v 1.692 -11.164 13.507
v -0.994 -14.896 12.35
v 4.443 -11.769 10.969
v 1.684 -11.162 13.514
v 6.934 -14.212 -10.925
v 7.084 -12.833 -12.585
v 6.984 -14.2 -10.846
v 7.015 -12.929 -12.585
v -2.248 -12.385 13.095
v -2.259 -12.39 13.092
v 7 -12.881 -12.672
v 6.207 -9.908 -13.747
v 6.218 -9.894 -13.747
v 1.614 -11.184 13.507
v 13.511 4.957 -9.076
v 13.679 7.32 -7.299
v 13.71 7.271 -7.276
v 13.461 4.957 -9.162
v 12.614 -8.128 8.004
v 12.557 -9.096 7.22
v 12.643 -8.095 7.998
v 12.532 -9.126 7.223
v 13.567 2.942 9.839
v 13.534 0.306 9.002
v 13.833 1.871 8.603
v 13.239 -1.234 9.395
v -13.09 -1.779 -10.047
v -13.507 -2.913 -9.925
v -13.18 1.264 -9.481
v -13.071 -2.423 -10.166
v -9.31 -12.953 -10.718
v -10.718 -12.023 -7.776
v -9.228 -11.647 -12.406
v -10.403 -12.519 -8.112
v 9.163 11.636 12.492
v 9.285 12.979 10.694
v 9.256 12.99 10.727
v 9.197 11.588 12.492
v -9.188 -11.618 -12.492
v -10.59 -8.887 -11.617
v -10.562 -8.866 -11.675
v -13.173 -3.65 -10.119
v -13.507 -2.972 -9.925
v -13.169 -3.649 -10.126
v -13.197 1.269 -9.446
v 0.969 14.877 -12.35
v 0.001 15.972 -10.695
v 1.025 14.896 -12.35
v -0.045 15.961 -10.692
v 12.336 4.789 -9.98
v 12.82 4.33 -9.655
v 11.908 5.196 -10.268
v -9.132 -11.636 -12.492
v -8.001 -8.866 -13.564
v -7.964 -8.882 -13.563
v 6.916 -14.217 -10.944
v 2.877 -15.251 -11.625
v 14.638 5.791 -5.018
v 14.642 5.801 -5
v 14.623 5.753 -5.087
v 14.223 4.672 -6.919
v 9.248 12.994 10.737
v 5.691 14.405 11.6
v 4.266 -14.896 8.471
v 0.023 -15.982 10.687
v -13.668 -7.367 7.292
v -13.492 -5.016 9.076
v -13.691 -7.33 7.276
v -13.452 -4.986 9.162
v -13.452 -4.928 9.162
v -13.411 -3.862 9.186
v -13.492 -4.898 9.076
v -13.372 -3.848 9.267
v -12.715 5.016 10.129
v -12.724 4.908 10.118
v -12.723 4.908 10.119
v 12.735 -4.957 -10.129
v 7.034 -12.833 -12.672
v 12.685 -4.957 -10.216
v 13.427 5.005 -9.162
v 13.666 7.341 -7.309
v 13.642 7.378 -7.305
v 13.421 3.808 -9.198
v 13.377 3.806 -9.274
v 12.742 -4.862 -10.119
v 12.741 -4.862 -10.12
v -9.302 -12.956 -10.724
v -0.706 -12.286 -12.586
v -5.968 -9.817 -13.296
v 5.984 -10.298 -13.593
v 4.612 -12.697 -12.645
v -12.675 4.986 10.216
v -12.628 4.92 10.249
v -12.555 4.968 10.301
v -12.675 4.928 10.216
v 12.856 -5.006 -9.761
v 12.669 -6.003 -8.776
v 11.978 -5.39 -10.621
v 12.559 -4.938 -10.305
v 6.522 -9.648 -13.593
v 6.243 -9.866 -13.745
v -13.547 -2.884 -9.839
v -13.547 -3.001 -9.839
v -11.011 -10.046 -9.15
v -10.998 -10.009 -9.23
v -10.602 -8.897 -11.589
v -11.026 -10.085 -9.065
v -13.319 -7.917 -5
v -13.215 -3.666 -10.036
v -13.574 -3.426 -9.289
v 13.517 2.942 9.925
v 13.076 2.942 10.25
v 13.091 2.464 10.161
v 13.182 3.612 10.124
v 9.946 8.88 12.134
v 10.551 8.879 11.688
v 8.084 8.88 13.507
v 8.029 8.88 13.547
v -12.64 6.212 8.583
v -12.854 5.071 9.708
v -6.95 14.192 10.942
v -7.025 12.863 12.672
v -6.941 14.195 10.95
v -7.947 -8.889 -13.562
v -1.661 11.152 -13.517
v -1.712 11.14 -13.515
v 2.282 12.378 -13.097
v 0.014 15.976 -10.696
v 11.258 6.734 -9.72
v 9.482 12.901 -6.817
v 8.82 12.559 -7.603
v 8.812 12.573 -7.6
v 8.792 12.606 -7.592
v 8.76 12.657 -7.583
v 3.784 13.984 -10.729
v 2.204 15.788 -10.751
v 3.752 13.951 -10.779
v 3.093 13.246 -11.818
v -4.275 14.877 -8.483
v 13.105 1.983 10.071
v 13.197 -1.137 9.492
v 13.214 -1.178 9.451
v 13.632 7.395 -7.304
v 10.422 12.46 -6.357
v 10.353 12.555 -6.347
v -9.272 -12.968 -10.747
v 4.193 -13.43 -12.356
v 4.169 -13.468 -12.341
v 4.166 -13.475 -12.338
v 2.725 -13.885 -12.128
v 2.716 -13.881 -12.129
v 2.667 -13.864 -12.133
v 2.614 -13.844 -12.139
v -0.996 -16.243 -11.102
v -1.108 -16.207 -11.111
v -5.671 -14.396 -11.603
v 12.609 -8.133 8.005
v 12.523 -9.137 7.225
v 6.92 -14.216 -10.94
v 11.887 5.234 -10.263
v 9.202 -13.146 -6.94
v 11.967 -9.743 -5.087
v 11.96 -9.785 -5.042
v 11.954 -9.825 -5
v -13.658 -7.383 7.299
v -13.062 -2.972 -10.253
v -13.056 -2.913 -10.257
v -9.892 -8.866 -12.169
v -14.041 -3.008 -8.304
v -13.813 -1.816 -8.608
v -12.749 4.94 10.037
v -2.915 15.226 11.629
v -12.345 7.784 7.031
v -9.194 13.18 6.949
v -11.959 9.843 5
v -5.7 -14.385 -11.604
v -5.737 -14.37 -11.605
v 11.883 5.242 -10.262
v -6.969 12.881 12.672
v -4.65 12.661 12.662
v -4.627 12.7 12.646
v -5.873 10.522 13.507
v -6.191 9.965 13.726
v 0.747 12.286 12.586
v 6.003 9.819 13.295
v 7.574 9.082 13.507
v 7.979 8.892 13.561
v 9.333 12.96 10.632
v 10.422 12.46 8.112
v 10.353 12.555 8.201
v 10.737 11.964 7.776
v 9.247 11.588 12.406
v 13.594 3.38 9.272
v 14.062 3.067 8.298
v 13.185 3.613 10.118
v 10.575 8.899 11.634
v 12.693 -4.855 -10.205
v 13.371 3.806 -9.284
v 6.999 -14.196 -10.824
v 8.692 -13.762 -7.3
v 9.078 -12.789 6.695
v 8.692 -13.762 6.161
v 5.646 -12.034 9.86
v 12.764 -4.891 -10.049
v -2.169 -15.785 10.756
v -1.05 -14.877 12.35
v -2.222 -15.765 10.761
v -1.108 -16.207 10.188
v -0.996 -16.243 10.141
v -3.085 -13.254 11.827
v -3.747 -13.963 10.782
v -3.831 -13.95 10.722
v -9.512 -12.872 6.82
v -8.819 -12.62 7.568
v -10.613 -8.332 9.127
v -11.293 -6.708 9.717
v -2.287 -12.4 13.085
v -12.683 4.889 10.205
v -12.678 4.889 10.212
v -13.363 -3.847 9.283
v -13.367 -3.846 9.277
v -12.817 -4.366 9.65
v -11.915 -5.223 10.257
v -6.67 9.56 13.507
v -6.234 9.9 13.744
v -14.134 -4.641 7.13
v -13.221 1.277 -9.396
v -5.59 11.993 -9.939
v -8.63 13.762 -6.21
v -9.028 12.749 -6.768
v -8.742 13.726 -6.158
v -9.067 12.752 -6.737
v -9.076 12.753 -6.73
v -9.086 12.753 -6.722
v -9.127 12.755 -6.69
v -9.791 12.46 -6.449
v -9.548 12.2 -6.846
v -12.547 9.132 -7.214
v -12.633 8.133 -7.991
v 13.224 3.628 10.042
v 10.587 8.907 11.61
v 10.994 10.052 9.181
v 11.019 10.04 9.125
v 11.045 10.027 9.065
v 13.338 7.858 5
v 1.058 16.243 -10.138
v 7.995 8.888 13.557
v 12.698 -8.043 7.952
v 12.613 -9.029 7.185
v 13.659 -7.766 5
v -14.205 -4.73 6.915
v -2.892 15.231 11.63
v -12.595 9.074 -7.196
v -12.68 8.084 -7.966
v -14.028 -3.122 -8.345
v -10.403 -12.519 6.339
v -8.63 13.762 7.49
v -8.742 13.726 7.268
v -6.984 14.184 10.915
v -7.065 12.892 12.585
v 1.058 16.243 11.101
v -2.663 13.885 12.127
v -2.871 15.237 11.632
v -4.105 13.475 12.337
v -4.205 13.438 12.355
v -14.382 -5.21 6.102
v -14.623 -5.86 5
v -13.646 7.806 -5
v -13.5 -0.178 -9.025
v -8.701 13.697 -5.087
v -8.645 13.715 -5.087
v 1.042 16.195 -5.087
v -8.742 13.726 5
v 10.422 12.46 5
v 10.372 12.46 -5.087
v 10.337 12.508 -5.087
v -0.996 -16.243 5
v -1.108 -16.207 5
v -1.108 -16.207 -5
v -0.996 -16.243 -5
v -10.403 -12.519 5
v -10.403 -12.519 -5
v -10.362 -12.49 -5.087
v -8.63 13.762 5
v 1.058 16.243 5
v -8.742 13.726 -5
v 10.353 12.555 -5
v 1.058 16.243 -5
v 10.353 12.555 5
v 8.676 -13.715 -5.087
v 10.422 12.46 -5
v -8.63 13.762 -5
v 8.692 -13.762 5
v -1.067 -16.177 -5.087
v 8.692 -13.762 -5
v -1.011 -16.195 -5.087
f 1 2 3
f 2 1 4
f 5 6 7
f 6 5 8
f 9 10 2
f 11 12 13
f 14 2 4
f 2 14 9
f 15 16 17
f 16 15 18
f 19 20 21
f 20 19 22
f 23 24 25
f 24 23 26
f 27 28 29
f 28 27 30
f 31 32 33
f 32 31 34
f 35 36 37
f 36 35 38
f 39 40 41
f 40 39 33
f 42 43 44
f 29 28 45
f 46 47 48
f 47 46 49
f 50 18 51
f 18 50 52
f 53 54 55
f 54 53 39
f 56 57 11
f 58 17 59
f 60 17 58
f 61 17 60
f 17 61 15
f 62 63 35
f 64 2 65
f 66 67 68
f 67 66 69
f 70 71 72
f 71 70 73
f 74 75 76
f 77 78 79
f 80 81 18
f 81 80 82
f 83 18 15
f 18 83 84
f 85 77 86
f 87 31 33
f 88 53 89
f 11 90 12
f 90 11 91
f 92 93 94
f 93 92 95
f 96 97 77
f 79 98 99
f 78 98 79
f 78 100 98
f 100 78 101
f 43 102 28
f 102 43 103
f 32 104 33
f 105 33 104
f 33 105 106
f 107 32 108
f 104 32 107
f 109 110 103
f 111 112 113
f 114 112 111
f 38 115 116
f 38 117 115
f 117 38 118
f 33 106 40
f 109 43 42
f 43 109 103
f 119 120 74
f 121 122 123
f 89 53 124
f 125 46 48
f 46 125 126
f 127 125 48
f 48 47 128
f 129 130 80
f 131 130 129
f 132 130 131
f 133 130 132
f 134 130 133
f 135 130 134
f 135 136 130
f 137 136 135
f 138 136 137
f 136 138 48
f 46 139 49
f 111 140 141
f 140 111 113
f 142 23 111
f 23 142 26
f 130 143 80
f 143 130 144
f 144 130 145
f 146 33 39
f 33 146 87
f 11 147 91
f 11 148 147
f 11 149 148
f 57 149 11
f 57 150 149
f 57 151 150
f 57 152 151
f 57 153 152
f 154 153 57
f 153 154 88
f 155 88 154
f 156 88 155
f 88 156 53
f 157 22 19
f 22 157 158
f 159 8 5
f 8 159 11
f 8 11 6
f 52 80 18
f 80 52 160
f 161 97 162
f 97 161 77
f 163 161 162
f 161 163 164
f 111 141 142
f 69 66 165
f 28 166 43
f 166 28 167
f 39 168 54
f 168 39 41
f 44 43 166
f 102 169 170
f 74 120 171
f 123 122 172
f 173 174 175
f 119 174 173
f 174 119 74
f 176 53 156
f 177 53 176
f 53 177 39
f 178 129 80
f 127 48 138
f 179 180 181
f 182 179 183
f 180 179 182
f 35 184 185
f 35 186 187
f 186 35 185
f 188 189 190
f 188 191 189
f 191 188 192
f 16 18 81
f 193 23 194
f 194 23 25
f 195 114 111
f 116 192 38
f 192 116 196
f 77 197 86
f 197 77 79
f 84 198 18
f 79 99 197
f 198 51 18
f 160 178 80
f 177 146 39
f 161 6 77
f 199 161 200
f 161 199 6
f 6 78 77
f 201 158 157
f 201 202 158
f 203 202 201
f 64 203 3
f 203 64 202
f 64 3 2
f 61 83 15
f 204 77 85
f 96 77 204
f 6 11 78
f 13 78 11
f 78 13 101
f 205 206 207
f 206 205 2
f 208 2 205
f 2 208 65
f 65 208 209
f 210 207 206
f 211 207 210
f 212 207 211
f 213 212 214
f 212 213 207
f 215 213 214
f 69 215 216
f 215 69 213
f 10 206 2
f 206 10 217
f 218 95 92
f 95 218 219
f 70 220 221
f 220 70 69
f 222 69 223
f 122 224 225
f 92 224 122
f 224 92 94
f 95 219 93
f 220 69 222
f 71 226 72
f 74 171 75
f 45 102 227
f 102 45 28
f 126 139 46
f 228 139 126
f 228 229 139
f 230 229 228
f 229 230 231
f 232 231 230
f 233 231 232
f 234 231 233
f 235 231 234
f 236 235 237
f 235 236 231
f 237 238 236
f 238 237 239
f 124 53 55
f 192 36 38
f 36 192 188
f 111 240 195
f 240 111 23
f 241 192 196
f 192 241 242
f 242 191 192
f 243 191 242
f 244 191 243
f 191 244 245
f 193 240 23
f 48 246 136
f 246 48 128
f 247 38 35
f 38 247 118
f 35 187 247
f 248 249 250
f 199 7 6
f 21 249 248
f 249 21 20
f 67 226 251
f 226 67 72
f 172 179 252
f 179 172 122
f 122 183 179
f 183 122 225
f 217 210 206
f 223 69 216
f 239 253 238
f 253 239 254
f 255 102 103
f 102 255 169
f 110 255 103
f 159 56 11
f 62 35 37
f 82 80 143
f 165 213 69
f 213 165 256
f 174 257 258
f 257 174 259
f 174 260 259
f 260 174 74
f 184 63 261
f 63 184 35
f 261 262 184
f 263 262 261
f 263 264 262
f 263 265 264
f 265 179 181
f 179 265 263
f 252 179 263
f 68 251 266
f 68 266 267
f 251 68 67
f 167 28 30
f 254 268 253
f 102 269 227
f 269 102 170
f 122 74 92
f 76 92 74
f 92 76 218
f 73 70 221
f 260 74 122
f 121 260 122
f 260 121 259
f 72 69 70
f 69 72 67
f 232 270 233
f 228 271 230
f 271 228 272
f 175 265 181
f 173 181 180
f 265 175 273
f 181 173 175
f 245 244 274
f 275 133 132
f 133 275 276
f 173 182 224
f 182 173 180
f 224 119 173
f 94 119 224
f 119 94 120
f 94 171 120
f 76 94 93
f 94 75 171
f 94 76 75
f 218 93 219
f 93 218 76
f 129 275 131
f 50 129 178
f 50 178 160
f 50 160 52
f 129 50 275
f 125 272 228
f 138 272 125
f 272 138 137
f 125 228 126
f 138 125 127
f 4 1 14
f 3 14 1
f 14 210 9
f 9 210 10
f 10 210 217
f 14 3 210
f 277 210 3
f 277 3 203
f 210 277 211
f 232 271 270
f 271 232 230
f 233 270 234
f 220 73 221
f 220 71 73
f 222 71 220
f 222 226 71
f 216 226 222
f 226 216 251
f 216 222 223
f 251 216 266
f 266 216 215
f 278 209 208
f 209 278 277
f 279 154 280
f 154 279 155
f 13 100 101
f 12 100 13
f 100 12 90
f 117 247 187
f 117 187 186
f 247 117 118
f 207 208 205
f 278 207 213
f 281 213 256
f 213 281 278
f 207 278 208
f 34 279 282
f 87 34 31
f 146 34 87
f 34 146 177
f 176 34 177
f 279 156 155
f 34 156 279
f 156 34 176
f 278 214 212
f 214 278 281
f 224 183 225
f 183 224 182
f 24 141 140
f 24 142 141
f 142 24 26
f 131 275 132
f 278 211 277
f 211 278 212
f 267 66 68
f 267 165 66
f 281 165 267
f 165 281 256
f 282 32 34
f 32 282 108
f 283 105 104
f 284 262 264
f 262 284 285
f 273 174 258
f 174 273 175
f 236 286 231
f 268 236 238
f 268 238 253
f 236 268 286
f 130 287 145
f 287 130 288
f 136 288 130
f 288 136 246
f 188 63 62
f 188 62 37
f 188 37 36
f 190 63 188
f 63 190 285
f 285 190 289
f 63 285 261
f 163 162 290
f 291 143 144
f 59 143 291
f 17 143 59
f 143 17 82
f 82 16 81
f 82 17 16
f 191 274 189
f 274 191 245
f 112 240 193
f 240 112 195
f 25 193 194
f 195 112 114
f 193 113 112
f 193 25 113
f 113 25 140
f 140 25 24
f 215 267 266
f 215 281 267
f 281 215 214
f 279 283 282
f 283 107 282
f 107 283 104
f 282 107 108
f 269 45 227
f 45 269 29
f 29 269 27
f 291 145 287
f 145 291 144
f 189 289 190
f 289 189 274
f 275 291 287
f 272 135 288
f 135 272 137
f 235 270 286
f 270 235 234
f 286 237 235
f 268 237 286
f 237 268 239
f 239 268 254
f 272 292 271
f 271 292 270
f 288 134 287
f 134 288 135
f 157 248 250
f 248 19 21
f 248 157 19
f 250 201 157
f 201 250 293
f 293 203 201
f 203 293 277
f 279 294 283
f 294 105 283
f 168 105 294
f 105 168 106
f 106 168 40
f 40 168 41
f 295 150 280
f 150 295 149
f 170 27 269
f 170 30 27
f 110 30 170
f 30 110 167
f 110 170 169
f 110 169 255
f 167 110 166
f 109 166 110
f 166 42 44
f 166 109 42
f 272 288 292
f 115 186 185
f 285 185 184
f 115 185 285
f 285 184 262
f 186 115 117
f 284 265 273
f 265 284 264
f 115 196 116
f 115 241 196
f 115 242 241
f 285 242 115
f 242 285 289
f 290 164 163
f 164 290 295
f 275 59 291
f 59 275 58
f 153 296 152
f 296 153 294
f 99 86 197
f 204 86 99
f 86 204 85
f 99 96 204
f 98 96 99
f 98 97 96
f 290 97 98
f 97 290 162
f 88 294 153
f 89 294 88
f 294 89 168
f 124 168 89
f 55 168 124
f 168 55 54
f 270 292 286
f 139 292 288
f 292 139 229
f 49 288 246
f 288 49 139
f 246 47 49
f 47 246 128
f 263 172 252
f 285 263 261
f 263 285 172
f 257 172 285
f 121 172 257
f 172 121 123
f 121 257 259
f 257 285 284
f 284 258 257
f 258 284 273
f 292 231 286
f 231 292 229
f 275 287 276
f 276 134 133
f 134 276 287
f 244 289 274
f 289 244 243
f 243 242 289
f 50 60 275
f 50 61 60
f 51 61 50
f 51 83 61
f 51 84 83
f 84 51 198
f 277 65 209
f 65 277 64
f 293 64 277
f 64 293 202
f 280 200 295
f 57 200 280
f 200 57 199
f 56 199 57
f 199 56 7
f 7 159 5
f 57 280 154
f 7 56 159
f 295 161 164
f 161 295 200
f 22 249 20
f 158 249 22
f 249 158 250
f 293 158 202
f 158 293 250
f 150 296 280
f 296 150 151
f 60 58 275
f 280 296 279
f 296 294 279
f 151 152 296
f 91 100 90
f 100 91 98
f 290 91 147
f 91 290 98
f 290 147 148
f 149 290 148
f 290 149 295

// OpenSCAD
// Auto-generated OpenSCAD file

    inner_points = 10*[[-0.10267110435699114, -1.6147732450963963, 0.5000000000008641], [-0.1026711043570435, -1.6147732450969283, -0.4999999999991359], [0.1026711043570435, 1.6147732450969283, 0.4999999999991359], [0.10267110435699114, 1.6147732450963963, -0.5000000000008641], [0.8660772310082325, -1.3667275583225522, 0.5000000000006815], [0.8660772310081802, -1.3667275583230845, -0.4999999999993185], [-1.0322025675203217, -1.2460304363672796, 0.5000000000007166], [-1.032202567520374, -1.2460304363678119, -0.49999999999928335], [1.032202567520374, 1.2460304363678119, 0.49999999999928335], [1.0322025675203217, 1.2460304363672796, -0.5000000000007166], [-0.8660772310081802, 1.3667275583230845, 0.4999999999993185], [-0.8660772310082325, 1.3667275583225522, -0.5000000000006815], [1.504013501010716, -0.596638397630546, 0.5000000000002386], [1.5040135010106637, -0.5966383976310778, -0.4999999999997614], [-1.5674677331657878, -0.40134635196262397, 0.5000000000002954], [-1.5674677331658402, -0.4013463519631557, -0.4999999999997045], [1.5674677331658402, 0.4013463519631557, 0.4999999999997045], [1.5674677331657878, 0.40134635196262397, -0.5000000000002954], [-1.5040135010106637, 0.5966383976310778, 0.4999999999997614], [-1.504013501010716, 0.596638397630546, -0.5000000000002386], [0.2110002639625055, -0.8240665545671229, 1.8763819204716008], [-0.3136713683195228, -0.7907066905295395, -1.8763819204707366], [0.3136713683195228, 0.7907066905295395, 1.8763819204707366], [-0.2110002639625055, 0.8240665545671229, -1.8763819204716008], [-0.718531199200825, -0.4553237458380063, 1.8763819204714534], [0.6550769670457008, -0.5426610037556955, -1.8763819204709191], [-0.6550769670457008, 0.5426610037556955, 1.8763819204709191], [0.718531199200825, 0.4553237458380063, -1.8763819204714534], [0.8489365339649888, -0.05397739387511649, 1.8763819204711578], [-0.8489365339649888, 0.05397739387511649, -1.8763819204711578], [-0.5075309352384453, -1.2793903004064069, 1.3506508083527466], [0.3414055987263038, -1.3333676942839572, -1.3506508083513487], [-0.3414055987263038, 1.3333676942839572, 1.3506508083513487], [0.5075309352384453, 1.2793903004064069, -1.3506508083527466], [1.0599367979273688, -0.8780439484435167, 1.3506508083524513], [-1.162607902284386, -0.7367292966531456, -1.3506508083515871], [1.162607902284386, 0.7367292966531456, 1.3506508083515871], [-1.0599367979273688, 0.8780439484435167, -1.3506508083524513], [-1.3736081662466517, 0.0873372579164117, 1.3506508083520654], [1.3736081662466517, -0.0873372579164117, -1.3506508083520654]];

    outer_points = 10*[[1.3411441290868589, 0.49569687647638716, -0.9075522136038779], [1.263452202904808, -0.49569687647638716, -1.0129200987128433], [-1.263452202904808, 0.49569687647638716, 1.0129200987128433], [-1.3411441290868589, -0.49569687647638716, 0.9075522136038779], [0.5328721345308199, 0.6202033120279035, -1.4830472442710922], [0.45518020834876893, -0.3711904409248708, -1.5884151293800577], [1.6519824877191422, 0.3711904409248708, 0.034720391489278635], [1.574290561537091, -0.6202033120279035, -0.0706474936196867], [-1.574290561537091, 0.6202033120279035, 0.0706474936196867], [-1.6519824877191422, -0.3711904409248708, -0.034720391489278635], [-0.45518020834876893, 0.3711904409248708, 1.5884151293800577], [-0.5328721345308199, -0.6202033120279035, 1.4830472442710922], [-0.4641010661832383, 0.6971525210168389, -1.4719451591541524], [-0.5417929923652892, -0.29424123193593543, -1.5773130442631174], [1.3466575224373667, 0.29424123193593543, 0.983854462530699], [1.268965596255316, -0.6971525210168389, 0.8784865774217337], [-1.268965596255316, 0.6971525210168389, -0.8784865774217337], [-1.3466575224373667, -0.29424123193593543, -0.983854462530699], [0.5417929923652892, 0.29424123193593543, 1.5773130442631174], [0.4641010661832383, -0.6971525210168389, 1.4719451591541524], [0.642271561558062, 1.8946460465314703, -0.49215801202206017], [0.6600266044377715, -1.8946460465314703, -0.4680781441363005], [-0.6600266044377715, 1.8946460465314703, 0.4680781441363005], [-0.642271561558062, -1.8946460465314703, 0.49215801202206017], [0.9531099201903453, 1.770139610979954, 0.4501145930710967], [-0.14824539011826776, -1.770139610979954, -1.043573174803515], [0.14824539011826776, 1.770139610979954, 1.043573174803515], [-0.9531099201903453, -1.770139610979954, -0.4501145930710967], [-0.3547016391559959, 1.9715952555204057, -0.4810559269051196], [0.3547016391559959, -1.9715952555204057, 0.4810559269051196], [1.4087566933394584, 1.2833458031149498, -0.29514898898768743], [0.6984060027284527, -1.2833458031149498, -1.2585457489030916], [-0.6984060027284527, 1.2833458031149498, 1.2585457489030916], [-1.4087566933394584, -1.2833458031149498, 0.29514898898768743], [0.10094513399311722, 1.4848014476554017, -1.2263195089639038], [1.2013530320027161, -1.4848014476554017, 0.2660833528055431], [-1.2013530320027161, 1.4848014476554017, -0.2660833528055431], [-0.10094513399311722, -1.4848014476554017, 1.2263195089639038], [0.9147305218996641, 1.1588393675634334, 1.2405821978378877], [-0.9147305218996641, -1.1588393675634334, -1.2405821978378877]];

    // Convex hull for inner set (I)
    module inner_hull() {
        hull() {
            for (p = inner_points) {
                translate(p) sphere(r=0.1);
            }
        }
    }

    // Convex hull for outer set (O) minus inner hull (O \ I)
    module outer_minus_inner() {
        difference() {
            hull() {
                for (p = outer_points) {
                    translate(p) sphere(r=0.1);
                }
            }
            inner_hull(); // Subtract inner hull
        }
    }

    // Convex hull for outer set (O) minus all translated inner hulls
    module outer_minus_AllTranslationInner() {
        difference() {
            hull() {
                for (p = outer_points) {
                    translate(p) sphere(r=0.1);
                }
            }
            hull() {
                translate([0,0,50]) inner_hull();
                translate([0,0,-50]) inner_hull();
            }; // Subtract translated inner hulls
        }
    }

    // Difference between outer_minus_inner and outer_minus_AllTranslationInner
    module outer_minus_inner_diff() {
        difference() {
            // Outer minus inner
            difference() {
                hull() {
                    for (p = outer_points) {
                        translate(p) sphere(r=0.1);
                    }
                }
                inner_hull();
            }

            // Subtract Outer minus AllTranslationInner
            difference() {
                hull() {
                    for (p = outer_points) {
                        translate(p) sphere(r=0.1);
                    }
                }
                hull() {
                    translate([0,0,50]) inner_hull();
                    translate([0,0,-50]) inner_hull();
                };
            }
        }
    }

    // Rendering all with colors applied
    color([1, 1, 0, 1]) outer_minus_inner_diff(); // Opaque yellow
    
